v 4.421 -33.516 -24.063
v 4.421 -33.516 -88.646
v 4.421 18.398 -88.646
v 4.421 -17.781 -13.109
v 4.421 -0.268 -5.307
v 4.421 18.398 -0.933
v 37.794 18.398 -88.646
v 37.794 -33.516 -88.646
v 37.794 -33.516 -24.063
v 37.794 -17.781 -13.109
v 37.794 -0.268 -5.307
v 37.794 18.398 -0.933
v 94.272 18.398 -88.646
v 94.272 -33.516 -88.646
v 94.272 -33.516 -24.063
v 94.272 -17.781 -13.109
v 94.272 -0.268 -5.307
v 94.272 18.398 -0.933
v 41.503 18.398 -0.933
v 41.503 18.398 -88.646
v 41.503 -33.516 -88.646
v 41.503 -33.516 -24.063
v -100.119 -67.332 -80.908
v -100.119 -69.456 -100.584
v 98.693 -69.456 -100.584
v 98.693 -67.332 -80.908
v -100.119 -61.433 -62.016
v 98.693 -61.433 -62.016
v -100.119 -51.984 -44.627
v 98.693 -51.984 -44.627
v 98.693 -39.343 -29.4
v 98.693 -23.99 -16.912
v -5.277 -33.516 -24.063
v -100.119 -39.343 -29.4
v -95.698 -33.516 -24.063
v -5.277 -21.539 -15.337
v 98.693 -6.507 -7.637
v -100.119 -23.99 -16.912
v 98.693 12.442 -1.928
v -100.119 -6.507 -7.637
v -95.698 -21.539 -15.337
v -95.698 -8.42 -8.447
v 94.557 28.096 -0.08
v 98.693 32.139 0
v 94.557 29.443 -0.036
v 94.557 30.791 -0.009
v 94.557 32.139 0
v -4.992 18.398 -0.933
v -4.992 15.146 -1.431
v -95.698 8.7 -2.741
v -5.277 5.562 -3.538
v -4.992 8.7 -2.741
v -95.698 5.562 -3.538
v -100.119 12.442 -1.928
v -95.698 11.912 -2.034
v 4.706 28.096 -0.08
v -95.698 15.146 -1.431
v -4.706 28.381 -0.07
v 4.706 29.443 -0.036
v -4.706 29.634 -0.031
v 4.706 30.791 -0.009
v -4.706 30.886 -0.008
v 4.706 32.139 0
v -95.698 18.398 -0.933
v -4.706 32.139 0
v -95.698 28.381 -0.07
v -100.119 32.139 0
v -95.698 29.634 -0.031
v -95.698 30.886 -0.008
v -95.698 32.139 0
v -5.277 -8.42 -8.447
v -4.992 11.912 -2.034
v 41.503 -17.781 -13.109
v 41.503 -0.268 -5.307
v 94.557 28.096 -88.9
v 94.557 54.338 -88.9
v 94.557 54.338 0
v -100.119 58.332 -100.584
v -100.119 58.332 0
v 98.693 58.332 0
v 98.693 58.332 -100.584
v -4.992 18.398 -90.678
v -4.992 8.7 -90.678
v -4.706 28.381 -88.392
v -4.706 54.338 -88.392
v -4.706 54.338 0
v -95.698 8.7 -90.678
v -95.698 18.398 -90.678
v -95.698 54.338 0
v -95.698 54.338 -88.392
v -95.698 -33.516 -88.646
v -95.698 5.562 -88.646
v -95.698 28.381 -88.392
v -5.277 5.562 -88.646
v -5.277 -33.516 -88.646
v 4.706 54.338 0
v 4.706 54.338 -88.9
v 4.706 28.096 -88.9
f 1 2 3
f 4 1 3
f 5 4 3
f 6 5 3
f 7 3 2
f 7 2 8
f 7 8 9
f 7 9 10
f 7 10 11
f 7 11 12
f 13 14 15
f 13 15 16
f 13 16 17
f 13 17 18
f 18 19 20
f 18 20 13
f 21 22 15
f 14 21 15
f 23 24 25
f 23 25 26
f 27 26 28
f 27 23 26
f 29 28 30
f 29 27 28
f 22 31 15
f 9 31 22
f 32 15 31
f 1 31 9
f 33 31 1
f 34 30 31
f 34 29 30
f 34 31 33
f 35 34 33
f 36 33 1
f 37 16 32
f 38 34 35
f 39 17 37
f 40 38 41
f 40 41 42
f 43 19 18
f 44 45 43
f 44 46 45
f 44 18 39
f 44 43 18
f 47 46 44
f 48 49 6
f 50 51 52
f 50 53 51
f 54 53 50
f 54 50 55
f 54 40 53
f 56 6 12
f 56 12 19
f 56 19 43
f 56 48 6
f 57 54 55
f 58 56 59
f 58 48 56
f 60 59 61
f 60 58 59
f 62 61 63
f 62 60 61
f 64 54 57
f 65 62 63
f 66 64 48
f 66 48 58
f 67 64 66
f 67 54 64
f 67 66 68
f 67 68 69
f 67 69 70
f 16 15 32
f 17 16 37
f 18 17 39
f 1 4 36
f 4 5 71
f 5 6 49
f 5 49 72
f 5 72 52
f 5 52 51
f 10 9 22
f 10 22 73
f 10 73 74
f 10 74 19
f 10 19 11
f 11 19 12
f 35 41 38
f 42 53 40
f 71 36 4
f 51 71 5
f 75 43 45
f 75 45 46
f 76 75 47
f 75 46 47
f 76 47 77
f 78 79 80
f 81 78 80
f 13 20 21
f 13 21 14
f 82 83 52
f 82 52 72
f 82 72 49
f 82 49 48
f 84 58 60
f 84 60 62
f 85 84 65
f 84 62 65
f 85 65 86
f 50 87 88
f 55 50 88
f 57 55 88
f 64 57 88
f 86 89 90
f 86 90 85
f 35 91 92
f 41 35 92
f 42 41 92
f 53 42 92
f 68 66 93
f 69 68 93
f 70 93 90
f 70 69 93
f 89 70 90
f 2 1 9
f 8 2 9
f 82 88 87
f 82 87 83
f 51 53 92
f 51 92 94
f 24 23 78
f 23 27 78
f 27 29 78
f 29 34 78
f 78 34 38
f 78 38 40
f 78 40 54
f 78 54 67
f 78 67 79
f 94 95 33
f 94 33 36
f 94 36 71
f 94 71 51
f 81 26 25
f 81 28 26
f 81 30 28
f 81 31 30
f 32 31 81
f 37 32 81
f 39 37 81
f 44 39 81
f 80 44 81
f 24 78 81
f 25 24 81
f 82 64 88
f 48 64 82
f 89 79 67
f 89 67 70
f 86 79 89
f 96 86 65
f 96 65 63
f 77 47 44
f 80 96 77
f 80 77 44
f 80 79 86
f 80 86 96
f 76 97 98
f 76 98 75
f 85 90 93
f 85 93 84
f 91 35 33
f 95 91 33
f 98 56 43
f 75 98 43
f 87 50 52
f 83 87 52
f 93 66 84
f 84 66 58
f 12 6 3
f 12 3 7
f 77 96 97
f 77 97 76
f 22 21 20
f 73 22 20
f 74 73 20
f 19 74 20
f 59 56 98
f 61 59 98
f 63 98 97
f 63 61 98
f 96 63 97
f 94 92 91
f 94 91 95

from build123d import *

# Parameters (mm, degrees)
F0_W        = 198.8127231598
F0_H        = 127.7878135443
F1_DEPTH    = 100.584
F2_T1_DEPTH = 706.7873225248
F3_W        = 90.9917657264
F3_H        = 25.9568989277
F4_DEPTH    = 88.392
F5_W        = 89.8508075625
F5_H        = 26.2421388179
F6_DEPTH    = 88.646
F7_DEPTH    = 0.254
F8_DEPTH    = 0.254
F9_W        = 90.7065253705
F9_H        = 9.6981823444
F10_DEPTH   = 90.678
F11_W       = 90.4212845489
F11_H       = 39.0779660083
F11_W_2     = 33.3731551655
F11_H_2     = 51.9137959927
F11_W_3     = 52.7695268393
F12_DEPTH   = 88.646


# Not quite as in the source:
# - a fillet or chamfer that OpenCascade refuses, or shapes differently, is made with other operations: its cross-section is extruded or revolved along the edge and cut away or added


with BuildPart() as f1:
    # F0 (on Top) → F1 (new body)
    with BuildSketch(Plane.XY):
        with Locations((-0.7131025195, -5.5621936917)):
            Rectangle(F0_W, F0_H)
    extrude(amount=-F1_DEPTH)

    # F2: fillet of radius 101.6 on 1 edges, made by hand

    # F2_s2 → F2_t1 (cut)
    with BuildSketch(Plane.YZ.offset(-354.1067637819)):
        with BuildLine():
            ThreePointArc((-69.4561004639, -100.584), (-39.3431167706, -29.39963435), (32.1388194091, 0))
            Line((32.1388194091, 0), (-69.4561004639, 0))
            Line((-69.4561004639, 0), (-69.4561004639, -100.584))
        make_face()
    extrude(amount=F2_T1_DEPTH, mode=Mode.SUBTRACT)

    # F3 (on Top) → F4 (cut)
    with BuildSketch(Plane.XY):
        with Locations((-50.2023545559, 41.3598939776)):
            Rectangle(F3_W, F3_H)
    extrude(amount=-F4_DEPTH, mode=Mode.SUBTRACT)

    # F5 (on Top) → F6 (cut)
    with BuildSketch(Plane.XY):
        with Locations((49.631874077, 41.2172740325)):
            Rectangle(F5_W, F5_H)
    extrude(amount=-F6_DEPTH, mode=Mode.SUBTRACT)

    # F7 (cut): a face of the model
    f7_faces = [f1.faces().sort_by_distance(p)[0] for p in [
        (-50.2023545559, 41.3598939776, -88.392),
    ]]
    extrude(f7_faces, amount=F7_DEPTH, mode=Mode.SUBTRACT)

    # F8 (cut): a face of the model
    f8_faces = [f1.faces().sort_by_distance(p)[0] for p in [
        (49.631874077, 41.2172740325, -88.646),
    ]]
    extrude(f8_faces, amount=-F8_DEPTH, mode=Mode.SUBTRACT)

    # F9 (on Top) → F10 (cut)
    with BuildSketch(Plane.XY):
        with Locations((-50.3449747339, 13.5489311069)):
            Rectangle(F9_W, F9_H)
    extrude(amount=-F10_DEPTH, mode=Mode.SUBTRACT)

    # F11 (on Top) → F12 (cut)
    with BuildSketch(Plane.XY):
        with Locations((-50.4875951447, -13.9767907094)):
            Rectangle(F11_W, F11_H)
        with Locations((21.1078075226, -7.5588757172)):
            Rectangle(F11_W_2, F11_H_2)
        with Locations((67.8872764111, -7.5588757172)):
            Rectangle(F11_W_3, F11_H_2)
    extrude(amount=-F12_DEPTH, mode=Mode.SUBTRACT)


solid = f1.part
